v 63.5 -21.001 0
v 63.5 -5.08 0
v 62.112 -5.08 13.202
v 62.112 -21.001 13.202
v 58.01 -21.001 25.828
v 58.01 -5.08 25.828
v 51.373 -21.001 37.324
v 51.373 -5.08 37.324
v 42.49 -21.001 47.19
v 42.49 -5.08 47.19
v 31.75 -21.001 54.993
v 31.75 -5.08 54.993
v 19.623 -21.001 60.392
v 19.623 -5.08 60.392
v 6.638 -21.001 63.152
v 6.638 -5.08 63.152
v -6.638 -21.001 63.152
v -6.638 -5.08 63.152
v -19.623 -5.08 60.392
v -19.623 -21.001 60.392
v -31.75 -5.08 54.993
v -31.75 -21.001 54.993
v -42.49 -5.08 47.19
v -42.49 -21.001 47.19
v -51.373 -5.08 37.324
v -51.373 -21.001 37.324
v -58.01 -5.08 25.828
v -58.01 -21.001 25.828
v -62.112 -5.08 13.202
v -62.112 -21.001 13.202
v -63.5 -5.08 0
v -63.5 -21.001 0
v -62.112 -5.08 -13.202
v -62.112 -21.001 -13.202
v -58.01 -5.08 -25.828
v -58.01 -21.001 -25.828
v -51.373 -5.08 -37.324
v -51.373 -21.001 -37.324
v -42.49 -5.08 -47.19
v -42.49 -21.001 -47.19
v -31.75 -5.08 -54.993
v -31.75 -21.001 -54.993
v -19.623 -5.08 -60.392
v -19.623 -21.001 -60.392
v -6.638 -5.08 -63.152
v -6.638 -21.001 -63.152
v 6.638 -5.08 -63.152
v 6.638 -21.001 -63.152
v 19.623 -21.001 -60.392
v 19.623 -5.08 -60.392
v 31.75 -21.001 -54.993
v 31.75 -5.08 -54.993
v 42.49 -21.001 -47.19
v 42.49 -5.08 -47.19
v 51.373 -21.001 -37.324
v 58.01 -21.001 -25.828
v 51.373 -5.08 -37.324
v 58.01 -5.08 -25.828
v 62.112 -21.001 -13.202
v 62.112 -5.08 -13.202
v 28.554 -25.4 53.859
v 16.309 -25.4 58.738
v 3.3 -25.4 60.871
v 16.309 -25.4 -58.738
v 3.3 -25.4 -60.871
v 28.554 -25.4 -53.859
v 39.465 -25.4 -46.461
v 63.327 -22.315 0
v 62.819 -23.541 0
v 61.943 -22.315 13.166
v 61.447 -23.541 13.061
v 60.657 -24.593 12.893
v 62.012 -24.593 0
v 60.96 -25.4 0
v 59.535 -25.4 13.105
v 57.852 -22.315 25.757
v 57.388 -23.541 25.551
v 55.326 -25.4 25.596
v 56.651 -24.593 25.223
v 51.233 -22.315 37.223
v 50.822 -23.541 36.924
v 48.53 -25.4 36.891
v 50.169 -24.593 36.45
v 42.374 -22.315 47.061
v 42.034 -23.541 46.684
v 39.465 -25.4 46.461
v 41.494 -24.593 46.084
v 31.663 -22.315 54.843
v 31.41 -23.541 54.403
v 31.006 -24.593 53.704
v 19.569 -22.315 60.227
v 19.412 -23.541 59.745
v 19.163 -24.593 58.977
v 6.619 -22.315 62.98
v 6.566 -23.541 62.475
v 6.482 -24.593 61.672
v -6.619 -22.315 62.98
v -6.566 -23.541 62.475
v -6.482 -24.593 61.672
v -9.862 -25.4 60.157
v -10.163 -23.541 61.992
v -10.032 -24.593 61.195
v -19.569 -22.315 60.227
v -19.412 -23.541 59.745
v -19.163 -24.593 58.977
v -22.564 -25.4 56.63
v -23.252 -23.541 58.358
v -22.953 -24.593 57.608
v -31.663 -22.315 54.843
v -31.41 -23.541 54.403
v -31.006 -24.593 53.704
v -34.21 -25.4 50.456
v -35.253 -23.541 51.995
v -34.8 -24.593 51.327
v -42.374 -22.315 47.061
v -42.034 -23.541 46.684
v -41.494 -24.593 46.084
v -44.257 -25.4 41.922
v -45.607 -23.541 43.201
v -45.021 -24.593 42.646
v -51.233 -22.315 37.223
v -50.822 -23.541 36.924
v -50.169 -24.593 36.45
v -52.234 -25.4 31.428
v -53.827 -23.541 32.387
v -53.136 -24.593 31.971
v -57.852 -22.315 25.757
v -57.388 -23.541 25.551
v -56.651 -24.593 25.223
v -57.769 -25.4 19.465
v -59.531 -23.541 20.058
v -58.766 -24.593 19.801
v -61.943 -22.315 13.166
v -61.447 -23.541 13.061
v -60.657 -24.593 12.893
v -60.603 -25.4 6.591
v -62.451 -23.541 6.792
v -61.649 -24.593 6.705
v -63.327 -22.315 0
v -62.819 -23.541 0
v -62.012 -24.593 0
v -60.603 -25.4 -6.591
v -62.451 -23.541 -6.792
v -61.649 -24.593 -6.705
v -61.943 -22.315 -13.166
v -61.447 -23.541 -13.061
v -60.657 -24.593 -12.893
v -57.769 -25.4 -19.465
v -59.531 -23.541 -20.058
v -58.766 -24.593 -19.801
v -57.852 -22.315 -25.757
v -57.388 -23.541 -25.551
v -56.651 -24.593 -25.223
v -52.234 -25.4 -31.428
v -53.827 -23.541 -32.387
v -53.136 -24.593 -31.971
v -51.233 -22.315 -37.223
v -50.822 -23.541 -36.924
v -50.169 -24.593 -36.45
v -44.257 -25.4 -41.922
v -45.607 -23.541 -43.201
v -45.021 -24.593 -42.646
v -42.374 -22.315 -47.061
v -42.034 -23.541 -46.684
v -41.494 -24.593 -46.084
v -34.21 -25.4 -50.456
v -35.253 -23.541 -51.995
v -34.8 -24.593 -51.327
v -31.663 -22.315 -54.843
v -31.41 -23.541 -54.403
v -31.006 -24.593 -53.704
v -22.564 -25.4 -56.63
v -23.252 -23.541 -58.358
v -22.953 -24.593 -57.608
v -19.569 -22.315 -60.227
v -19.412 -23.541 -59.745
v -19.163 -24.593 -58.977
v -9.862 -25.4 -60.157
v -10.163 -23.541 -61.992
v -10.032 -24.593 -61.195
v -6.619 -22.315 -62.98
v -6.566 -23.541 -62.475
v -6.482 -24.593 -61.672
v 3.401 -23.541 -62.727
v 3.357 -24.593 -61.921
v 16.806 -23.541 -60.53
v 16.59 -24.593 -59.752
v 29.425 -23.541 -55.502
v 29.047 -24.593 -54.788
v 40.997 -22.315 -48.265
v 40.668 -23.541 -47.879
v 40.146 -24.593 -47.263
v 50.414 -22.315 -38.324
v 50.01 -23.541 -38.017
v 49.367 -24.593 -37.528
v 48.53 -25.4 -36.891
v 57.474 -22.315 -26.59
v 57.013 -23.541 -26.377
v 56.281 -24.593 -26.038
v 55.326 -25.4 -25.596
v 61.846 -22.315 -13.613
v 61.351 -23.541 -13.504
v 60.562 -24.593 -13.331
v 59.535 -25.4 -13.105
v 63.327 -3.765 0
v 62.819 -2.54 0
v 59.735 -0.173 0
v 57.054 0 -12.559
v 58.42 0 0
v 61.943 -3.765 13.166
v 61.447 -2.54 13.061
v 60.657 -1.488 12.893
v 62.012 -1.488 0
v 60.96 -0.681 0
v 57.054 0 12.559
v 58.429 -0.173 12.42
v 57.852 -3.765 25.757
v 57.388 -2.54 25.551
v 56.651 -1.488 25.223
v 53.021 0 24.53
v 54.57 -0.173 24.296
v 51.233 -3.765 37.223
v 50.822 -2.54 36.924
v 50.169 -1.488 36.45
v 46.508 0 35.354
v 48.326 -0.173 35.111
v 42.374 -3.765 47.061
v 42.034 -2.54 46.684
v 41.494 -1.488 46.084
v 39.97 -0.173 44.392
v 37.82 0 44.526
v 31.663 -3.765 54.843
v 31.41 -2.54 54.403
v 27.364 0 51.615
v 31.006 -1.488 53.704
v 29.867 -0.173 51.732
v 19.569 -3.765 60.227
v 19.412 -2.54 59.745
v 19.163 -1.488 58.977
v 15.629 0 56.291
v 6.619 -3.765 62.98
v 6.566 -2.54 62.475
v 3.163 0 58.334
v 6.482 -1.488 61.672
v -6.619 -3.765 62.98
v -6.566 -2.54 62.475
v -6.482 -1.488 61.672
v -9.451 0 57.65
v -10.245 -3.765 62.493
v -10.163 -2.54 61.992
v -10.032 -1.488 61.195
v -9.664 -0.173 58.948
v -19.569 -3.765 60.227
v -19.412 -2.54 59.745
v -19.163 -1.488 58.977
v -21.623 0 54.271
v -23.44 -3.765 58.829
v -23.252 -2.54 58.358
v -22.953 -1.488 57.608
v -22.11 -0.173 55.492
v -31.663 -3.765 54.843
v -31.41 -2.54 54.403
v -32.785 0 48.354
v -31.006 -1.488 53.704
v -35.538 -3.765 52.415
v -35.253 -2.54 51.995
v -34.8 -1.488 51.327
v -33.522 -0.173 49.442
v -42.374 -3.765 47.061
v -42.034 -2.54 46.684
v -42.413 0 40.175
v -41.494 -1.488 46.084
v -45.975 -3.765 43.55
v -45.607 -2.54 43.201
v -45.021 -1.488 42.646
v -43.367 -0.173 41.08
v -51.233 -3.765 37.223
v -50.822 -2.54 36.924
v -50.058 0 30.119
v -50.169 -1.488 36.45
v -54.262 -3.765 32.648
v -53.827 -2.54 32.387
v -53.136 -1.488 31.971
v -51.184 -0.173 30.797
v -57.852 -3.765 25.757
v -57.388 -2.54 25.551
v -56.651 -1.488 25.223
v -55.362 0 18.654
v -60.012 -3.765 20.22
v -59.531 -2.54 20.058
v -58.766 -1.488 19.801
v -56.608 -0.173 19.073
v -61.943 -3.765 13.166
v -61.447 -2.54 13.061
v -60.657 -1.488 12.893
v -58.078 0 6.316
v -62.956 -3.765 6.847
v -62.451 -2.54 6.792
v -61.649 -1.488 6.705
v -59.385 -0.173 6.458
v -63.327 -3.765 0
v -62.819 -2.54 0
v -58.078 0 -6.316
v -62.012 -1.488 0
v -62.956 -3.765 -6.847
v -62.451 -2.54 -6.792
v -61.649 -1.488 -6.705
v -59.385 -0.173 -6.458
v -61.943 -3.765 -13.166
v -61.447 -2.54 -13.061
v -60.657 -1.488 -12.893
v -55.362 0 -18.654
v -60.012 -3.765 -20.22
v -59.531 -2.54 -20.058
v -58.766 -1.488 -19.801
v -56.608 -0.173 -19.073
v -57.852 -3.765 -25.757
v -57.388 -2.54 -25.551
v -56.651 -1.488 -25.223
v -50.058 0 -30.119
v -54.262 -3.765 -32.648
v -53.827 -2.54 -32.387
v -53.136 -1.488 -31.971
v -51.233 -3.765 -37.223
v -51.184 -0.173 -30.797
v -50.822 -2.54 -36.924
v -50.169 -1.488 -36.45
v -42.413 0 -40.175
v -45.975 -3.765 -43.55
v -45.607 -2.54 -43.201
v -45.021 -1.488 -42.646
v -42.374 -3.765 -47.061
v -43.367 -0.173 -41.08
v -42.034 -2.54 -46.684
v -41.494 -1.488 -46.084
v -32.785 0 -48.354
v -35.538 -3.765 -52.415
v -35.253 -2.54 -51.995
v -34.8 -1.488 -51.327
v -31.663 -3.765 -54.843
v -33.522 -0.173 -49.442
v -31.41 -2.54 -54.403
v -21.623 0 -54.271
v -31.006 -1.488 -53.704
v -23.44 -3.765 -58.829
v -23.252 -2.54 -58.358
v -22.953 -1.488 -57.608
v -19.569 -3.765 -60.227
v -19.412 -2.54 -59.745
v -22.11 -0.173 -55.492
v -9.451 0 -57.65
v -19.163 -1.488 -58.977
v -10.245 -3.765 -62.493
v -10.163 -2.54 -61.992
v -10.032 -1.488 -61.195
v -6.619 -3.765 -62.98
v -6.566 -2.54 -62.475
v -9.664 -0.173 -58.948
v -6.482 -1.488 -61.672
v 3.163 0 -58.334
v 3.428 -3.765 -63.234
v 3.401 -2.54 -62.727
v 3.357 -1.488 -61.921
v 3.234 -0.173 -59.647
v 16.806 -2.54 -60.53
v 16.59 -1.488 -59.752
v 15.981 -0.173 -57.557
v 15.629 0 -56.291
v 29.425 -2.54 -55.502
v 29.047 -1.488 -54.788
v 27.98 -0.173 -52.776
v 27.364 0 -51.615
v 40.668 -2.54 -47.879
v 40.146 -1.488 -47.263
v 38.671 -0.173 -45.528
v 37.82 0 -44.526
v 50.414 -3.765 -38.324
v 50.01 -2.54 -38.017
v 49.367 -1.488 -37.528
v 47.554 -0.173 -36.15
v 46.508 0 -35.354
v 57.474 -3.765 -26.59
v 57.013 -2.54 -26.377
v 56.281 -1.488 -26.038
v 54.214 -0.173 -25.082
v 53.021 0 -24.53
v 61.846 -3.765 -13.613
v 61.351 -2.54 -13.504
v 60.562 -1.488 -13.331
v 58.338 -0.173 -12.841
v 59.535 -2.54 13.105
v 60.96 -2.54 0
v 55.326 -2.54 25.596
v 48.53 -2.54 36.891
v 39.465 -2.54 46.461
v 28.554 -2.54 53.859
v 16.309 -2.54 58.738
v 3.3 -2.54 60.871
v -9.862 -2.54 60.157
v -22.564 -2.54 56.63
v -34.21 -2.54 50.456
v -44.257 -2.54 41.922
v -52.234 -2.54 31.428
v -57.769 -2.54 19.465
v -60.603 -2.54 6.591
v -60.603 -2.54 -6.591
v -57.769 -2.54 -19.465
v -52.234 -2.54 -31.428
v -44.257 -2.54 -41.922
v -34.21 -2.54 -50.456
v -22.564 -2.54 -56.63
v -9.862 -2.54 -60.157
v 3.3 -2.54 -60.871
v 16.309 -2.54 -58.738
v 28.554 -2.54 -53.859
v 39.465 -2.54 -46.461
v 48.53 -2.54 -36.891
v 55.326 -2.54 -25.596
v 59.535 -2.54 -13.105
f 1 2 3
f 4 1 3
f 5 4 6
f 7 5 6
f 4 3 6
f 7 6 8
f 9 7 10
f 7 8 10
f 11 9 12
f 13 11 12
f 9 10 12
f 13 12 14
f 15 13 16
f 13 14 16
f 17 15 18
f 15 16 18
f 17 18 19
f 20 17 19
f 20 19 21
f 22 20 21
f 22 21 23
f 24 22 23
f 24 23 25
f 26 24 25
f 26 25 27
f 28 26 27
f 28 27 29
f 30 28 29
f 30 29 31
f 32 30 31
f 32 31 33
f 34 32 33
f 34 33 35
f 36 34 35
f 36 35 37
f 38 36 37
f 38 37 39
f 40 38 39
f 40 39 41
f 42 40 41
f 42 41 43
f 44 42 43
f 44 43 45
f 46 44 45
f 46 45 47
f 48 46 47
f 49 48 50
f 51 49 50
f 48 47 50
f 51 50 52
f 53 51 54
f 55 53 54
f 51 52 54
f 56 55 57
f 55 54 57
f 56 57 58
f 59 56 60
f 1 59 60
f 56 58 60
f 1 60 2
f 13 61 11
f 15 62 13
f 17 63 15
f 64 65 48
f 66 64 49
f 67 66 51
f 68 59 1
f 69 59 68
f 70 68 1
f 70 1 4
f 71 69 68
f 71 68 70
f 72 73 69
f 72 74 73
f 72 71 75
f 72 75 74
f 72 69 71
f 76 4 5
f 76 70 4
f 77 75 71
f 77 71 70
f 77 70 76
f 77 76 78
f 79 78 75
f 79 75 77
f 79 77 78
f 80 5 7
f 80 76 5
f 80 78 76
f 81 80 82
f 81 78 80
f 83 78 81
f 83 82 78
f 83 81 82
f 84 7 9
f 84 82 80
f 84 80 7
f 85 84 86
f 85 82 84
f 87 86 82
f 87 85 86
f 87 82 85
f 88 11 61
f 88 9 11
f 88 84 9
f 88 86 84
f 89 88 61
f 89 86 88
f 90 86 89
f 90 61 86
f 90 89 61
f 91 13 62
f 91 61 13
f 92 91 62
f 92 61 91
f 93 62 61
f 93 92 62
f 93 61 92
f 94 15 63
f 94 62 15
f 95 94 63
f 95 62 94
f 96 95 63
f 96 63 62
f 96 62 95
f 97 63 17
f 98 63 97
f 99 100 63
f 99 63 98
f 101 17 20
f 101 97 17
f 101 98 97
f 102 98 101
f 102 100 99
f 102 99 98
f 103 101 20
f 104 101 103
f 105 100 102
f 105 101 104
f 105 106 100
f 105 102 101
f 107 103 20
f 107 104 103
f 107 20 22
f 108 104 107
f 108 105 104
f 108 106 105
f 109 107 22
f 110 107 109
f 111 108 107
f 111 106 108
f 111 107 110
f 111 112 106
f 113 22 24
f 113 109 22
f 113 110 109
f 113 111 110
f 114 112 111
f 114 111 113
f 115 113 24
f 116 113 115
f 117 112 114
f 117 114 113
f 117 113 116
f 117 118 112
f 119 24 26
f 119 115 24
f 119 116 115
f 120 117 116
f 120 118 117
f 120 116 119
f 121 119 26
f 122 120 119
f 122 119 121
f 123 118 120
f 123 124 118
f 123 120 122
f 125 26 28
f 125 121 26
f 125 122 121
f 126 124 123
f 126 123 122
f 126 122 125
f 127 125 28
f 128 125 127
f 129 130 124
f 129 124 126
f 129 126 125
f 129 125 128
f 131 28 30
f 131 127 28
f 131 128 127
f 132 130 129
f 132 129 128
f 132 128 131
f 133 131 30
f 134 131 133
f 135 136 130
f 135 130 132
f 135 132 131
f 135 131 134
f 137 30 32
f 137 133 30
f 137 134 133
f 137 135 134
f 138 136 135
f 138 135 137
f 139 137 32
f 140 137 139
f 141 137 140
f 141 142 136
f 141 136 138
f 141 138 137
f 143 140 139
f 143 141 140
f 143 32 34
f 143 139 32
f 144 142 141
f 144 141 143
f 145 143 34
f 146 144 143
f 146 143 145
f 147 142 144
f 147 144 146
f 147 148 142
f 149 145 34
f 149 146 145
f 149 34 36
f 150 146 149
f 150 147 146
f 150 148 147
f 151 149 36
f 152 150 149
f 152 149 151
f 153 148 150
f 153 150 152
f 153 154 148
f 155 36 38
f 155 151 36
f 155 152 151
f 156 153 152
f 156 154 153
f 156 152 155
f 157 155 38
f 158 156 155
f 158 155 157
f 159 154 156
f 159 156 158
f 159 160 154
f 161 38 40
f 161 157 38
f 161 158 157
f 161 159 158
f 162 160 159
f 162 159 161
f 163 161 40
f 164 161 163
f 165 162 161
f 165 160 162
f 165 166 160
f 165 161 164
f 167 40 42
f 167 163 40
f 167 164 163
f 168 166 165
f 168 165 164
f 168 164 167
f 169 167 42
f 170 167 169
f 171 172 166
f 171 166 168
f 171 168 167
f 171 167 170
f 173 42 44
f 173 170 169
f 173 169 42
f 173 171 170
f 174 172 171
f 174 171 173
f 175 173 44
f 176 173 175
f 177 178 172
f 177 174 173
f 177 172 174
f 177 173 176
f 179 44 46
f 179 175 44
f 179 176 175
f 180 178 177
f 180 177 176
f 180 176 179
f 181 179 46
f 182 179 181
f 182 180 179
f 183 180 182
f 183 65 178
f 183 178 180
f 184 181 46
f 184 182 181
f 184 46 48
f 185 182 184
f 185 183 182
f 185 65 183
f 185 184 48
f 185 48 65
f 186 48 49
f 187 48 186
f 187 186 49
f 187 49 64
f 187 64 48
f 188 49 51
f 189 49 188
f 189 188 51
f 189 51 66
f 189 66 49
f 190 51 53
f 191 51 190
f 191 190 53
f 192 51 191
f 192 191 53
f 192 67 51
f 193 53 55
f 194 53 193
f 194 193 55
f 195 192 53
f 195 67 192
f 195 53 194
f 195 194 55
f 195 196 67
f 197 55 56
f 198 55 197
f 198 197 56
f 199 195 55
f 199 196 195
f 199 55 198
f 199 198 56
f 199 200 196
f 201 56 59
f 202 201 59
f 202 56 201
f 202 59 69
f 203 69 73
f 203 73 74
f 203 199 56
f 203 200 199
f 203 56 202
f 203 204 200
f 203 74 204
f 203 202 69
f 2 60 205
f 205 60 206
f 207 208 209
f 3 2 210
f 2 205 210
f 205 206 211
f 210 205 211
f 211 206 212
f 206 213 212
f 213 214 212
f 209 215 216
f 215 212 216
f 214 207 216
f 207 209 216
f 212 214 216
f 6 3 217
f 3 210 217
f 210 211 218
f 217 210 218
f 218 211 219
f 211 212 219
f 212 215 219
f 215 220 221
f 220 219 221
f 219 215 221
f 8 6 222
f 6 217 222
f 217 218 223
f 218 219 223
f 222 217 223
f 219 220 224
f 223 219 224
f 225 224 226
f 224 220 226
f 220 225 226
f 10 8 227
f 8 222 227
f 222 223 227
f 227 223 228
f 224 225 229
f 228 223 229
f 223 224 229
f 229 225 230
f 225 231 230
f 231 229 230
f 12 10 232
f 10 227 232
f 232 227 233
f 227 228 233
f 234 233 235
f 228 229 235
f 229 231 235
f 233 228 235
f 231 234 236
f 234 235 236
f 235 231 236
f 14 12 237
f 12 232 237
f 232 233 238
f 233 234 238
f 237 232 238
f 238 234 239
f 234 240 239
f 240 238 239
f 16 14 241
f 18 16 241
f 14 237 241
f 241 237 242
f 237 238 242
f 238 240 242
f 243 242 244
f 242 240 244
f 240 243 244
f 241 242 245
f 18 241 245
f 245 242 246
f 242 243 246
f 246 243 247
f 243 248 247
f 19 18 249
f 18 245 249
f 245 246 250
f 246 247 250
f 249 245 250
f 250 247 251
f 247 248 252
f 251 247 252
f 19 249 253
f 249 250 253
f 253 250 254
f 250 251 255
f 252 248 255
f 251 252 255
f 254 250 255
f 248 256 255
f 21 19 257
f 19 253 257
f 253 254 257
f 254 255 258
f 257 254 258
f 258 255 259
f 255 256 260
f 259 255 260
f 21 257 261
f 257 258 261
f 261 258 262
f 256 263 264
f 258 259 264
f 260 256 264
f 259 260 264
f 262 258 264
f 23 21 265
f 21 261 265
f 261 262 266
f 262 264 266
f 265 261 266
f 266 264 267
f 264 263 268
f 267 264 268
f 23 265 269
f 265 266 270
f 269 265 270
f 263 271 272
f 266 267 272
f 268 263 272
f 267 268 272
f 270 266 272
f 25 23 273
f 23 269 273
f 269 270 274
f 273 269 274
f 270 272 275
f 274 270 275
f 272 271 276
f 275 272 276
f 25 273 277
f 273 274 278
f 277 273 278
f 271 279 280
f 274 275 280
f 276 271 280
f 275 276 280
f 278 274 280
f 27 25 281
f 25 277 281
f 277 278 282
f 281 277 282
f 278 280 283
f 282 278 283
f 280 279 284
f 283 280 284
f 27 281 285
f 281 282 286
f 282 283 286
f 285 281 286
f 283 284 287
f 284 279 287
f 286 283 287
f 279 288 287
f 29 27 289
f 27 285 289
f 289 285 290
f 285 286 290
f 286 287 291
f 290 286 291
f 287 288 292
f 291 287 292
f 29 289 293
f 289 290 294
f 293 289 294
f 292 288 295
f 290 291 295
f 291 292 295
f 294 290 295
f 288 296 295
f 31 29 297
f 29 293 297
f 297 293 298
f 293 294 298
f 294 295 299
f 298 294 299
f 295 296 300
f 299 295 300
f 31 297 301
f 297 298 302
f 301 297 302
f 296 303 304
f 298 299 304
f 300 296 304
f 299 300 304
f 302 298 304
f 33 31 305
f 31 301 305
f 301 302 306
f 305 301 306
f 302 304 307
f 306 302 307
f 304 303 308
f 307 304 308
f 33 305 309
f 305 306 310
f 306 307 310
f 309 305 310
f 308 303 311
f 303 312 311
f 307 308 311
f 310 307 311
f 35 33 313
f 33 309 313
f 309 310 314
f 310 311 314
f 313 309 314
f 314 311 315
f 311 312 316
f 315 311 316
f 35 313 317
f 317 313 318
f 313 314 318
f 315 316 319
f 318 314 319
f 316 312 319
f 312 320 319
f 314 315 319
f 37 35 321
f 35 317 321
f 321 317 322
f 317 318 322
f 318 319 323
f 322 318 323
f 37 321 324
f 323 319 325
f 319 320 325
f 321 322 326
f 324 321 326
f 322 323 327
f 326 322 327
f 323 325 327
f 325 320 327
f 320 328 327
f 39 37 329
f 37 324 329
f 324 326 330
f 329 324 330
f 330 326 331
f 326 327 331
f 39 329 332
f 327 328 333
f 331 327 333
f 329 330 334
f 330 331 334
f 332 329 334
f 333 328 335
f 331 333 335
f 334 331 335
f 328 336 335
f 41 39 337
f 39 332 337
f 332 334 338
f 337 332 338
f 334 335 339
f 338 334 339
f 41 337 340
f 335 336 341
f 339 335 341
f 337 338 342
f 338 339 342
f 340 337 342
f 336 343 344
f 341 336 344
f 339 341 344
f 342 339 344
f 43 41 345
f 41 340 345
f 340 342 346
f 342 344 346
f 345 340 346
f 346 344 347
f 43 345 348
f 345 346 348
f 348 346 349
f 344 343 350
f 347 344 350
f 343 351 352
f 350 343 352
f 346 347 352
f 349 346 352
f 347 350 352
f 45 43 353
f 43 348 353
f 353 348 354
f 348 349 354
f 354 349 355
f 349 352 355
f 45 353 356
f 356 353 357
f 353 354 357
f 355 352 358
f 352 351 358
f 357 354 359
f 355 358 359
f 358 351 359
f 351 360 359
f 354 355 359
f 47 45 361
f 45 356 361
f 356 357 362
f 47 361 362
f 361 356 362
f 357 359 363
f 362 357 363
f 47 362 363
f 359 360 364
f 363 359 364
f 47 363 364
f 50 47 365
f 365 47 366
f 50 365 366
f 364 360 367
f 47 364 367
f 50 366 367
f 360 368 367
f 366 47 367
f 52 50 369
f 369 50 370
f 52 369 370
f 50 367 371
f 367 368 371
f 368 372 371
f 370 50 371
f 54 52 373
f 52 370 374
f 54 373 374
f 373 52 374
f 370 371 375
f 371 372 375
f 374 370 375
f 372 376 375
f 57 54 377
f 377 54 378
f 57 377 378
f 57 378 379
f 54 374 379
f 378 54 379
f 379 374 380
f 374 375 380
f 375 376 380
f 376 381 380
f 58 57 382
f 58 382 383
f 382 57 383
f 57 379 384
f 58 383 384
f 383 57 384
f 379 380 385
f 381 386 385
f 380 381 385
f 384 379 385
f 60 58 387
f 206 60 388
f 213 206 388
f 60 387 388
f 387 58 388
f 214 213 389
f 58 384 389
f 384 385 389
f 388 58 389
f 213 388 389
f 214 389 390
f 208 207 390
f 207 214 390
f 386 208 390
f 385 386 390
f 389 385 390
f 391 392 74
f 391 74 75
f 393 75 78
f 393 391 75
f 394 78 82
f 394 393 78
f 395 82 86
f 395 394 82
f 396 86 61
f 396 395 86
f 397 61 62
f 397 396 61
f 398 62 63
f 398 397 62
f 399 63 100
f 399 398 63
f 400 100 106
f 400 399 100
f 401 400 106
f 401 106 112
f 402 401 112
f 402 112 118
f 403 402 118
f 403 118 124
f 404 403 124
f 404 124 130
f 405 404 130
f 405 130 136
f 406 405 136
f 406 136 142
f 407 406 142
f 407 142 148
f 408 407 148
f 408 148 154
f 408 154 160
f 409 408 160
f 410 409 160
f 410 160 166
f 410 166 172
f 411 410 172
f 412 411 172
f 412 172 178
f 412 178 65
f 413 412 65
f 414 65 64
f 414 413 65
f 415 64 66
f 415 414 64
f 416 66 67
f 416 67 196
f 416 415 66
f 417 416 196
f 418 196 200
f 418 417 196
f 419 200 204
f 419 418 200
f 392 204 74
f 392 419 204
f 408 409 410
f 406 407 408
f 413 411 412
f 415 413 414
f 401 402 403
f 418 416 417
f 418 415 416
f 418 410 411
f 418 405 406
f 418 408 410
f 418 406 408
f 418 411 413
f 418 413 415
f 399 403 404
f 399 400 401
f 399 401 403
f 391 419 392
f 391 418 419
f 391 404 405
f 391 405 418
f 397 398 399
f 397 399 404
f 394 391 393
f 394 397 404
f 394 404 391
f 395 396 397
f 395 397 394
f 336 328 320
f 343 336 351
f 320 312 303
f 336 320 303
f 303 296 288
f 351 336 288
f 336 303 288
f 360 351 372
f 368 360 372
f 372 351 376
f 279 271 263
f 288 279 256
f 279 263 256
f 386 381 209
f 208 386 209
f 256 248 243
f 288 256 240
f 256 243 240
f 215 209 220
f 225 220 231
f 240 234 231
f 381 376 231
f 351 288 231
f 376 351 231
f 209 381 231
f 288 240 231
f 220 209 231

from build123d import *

# Parameters (mm, degrees)
F0_R     = 63.5
F1_DEPTH = 25.4
F2_T     = -2.54


# Not quite as in the source:
# - a fillet or chamfer that OpenCascade refuses, or shapes differently, is made with other operations: its cross-section is extruded or revolved along the edge and cut away or added


with BuildPart() as f1:
    # F0 (on Front) → F1 (new body)
    with BuildSketch(Plane.XZ):
        Circle(F0_R)
    extrude(amount=F1_DEPTH)

    # F2
    f2_openings = [f1.faces().sort_by_distance(p)[0] for p in [
        (0, -25.4, 0),
    ]]
    offset(amount=F2_T, openings=f2_openings)

    # F3: fillet of radius 5.08 on 3 edges, made by hand

    # F3_s1 → F3_t2 (revolve, cut)
    with BuildSketch(Plane.XY):
        with BuildLine():
            ThreePointArc((63.5, -5.08), (62.0121024484, -1.4878975516), (58.42, 0))
            Line((58.42, 0), (63.5, 0))
            Line((63.5, 0), (63.5, -5.08))
        make_face()
    revolve(axis=Axis((0, 0, 0), (0, -1, 0)), mode=Mode.SUBTRACT)

    # F3_s3 → F3_t4 (revolve, cut)
    with BuildSketch(Plane.XY):
        with BuildLine():
            ThreePointArc((63.5, -21.0005909488), (62.8194090512, -23.5405909488), (60.96, -25.4))
            Line((60.96, -25.4), (63.5, -25.4))
            Line((63.5, -25.4), (63.5, -21.0005909488))
        make_face()
    revolve(axis=Axis((0, -25.4, 0), (0, -1, 0)), mode=Mode.SUBTRACT)


solid = f1.part
